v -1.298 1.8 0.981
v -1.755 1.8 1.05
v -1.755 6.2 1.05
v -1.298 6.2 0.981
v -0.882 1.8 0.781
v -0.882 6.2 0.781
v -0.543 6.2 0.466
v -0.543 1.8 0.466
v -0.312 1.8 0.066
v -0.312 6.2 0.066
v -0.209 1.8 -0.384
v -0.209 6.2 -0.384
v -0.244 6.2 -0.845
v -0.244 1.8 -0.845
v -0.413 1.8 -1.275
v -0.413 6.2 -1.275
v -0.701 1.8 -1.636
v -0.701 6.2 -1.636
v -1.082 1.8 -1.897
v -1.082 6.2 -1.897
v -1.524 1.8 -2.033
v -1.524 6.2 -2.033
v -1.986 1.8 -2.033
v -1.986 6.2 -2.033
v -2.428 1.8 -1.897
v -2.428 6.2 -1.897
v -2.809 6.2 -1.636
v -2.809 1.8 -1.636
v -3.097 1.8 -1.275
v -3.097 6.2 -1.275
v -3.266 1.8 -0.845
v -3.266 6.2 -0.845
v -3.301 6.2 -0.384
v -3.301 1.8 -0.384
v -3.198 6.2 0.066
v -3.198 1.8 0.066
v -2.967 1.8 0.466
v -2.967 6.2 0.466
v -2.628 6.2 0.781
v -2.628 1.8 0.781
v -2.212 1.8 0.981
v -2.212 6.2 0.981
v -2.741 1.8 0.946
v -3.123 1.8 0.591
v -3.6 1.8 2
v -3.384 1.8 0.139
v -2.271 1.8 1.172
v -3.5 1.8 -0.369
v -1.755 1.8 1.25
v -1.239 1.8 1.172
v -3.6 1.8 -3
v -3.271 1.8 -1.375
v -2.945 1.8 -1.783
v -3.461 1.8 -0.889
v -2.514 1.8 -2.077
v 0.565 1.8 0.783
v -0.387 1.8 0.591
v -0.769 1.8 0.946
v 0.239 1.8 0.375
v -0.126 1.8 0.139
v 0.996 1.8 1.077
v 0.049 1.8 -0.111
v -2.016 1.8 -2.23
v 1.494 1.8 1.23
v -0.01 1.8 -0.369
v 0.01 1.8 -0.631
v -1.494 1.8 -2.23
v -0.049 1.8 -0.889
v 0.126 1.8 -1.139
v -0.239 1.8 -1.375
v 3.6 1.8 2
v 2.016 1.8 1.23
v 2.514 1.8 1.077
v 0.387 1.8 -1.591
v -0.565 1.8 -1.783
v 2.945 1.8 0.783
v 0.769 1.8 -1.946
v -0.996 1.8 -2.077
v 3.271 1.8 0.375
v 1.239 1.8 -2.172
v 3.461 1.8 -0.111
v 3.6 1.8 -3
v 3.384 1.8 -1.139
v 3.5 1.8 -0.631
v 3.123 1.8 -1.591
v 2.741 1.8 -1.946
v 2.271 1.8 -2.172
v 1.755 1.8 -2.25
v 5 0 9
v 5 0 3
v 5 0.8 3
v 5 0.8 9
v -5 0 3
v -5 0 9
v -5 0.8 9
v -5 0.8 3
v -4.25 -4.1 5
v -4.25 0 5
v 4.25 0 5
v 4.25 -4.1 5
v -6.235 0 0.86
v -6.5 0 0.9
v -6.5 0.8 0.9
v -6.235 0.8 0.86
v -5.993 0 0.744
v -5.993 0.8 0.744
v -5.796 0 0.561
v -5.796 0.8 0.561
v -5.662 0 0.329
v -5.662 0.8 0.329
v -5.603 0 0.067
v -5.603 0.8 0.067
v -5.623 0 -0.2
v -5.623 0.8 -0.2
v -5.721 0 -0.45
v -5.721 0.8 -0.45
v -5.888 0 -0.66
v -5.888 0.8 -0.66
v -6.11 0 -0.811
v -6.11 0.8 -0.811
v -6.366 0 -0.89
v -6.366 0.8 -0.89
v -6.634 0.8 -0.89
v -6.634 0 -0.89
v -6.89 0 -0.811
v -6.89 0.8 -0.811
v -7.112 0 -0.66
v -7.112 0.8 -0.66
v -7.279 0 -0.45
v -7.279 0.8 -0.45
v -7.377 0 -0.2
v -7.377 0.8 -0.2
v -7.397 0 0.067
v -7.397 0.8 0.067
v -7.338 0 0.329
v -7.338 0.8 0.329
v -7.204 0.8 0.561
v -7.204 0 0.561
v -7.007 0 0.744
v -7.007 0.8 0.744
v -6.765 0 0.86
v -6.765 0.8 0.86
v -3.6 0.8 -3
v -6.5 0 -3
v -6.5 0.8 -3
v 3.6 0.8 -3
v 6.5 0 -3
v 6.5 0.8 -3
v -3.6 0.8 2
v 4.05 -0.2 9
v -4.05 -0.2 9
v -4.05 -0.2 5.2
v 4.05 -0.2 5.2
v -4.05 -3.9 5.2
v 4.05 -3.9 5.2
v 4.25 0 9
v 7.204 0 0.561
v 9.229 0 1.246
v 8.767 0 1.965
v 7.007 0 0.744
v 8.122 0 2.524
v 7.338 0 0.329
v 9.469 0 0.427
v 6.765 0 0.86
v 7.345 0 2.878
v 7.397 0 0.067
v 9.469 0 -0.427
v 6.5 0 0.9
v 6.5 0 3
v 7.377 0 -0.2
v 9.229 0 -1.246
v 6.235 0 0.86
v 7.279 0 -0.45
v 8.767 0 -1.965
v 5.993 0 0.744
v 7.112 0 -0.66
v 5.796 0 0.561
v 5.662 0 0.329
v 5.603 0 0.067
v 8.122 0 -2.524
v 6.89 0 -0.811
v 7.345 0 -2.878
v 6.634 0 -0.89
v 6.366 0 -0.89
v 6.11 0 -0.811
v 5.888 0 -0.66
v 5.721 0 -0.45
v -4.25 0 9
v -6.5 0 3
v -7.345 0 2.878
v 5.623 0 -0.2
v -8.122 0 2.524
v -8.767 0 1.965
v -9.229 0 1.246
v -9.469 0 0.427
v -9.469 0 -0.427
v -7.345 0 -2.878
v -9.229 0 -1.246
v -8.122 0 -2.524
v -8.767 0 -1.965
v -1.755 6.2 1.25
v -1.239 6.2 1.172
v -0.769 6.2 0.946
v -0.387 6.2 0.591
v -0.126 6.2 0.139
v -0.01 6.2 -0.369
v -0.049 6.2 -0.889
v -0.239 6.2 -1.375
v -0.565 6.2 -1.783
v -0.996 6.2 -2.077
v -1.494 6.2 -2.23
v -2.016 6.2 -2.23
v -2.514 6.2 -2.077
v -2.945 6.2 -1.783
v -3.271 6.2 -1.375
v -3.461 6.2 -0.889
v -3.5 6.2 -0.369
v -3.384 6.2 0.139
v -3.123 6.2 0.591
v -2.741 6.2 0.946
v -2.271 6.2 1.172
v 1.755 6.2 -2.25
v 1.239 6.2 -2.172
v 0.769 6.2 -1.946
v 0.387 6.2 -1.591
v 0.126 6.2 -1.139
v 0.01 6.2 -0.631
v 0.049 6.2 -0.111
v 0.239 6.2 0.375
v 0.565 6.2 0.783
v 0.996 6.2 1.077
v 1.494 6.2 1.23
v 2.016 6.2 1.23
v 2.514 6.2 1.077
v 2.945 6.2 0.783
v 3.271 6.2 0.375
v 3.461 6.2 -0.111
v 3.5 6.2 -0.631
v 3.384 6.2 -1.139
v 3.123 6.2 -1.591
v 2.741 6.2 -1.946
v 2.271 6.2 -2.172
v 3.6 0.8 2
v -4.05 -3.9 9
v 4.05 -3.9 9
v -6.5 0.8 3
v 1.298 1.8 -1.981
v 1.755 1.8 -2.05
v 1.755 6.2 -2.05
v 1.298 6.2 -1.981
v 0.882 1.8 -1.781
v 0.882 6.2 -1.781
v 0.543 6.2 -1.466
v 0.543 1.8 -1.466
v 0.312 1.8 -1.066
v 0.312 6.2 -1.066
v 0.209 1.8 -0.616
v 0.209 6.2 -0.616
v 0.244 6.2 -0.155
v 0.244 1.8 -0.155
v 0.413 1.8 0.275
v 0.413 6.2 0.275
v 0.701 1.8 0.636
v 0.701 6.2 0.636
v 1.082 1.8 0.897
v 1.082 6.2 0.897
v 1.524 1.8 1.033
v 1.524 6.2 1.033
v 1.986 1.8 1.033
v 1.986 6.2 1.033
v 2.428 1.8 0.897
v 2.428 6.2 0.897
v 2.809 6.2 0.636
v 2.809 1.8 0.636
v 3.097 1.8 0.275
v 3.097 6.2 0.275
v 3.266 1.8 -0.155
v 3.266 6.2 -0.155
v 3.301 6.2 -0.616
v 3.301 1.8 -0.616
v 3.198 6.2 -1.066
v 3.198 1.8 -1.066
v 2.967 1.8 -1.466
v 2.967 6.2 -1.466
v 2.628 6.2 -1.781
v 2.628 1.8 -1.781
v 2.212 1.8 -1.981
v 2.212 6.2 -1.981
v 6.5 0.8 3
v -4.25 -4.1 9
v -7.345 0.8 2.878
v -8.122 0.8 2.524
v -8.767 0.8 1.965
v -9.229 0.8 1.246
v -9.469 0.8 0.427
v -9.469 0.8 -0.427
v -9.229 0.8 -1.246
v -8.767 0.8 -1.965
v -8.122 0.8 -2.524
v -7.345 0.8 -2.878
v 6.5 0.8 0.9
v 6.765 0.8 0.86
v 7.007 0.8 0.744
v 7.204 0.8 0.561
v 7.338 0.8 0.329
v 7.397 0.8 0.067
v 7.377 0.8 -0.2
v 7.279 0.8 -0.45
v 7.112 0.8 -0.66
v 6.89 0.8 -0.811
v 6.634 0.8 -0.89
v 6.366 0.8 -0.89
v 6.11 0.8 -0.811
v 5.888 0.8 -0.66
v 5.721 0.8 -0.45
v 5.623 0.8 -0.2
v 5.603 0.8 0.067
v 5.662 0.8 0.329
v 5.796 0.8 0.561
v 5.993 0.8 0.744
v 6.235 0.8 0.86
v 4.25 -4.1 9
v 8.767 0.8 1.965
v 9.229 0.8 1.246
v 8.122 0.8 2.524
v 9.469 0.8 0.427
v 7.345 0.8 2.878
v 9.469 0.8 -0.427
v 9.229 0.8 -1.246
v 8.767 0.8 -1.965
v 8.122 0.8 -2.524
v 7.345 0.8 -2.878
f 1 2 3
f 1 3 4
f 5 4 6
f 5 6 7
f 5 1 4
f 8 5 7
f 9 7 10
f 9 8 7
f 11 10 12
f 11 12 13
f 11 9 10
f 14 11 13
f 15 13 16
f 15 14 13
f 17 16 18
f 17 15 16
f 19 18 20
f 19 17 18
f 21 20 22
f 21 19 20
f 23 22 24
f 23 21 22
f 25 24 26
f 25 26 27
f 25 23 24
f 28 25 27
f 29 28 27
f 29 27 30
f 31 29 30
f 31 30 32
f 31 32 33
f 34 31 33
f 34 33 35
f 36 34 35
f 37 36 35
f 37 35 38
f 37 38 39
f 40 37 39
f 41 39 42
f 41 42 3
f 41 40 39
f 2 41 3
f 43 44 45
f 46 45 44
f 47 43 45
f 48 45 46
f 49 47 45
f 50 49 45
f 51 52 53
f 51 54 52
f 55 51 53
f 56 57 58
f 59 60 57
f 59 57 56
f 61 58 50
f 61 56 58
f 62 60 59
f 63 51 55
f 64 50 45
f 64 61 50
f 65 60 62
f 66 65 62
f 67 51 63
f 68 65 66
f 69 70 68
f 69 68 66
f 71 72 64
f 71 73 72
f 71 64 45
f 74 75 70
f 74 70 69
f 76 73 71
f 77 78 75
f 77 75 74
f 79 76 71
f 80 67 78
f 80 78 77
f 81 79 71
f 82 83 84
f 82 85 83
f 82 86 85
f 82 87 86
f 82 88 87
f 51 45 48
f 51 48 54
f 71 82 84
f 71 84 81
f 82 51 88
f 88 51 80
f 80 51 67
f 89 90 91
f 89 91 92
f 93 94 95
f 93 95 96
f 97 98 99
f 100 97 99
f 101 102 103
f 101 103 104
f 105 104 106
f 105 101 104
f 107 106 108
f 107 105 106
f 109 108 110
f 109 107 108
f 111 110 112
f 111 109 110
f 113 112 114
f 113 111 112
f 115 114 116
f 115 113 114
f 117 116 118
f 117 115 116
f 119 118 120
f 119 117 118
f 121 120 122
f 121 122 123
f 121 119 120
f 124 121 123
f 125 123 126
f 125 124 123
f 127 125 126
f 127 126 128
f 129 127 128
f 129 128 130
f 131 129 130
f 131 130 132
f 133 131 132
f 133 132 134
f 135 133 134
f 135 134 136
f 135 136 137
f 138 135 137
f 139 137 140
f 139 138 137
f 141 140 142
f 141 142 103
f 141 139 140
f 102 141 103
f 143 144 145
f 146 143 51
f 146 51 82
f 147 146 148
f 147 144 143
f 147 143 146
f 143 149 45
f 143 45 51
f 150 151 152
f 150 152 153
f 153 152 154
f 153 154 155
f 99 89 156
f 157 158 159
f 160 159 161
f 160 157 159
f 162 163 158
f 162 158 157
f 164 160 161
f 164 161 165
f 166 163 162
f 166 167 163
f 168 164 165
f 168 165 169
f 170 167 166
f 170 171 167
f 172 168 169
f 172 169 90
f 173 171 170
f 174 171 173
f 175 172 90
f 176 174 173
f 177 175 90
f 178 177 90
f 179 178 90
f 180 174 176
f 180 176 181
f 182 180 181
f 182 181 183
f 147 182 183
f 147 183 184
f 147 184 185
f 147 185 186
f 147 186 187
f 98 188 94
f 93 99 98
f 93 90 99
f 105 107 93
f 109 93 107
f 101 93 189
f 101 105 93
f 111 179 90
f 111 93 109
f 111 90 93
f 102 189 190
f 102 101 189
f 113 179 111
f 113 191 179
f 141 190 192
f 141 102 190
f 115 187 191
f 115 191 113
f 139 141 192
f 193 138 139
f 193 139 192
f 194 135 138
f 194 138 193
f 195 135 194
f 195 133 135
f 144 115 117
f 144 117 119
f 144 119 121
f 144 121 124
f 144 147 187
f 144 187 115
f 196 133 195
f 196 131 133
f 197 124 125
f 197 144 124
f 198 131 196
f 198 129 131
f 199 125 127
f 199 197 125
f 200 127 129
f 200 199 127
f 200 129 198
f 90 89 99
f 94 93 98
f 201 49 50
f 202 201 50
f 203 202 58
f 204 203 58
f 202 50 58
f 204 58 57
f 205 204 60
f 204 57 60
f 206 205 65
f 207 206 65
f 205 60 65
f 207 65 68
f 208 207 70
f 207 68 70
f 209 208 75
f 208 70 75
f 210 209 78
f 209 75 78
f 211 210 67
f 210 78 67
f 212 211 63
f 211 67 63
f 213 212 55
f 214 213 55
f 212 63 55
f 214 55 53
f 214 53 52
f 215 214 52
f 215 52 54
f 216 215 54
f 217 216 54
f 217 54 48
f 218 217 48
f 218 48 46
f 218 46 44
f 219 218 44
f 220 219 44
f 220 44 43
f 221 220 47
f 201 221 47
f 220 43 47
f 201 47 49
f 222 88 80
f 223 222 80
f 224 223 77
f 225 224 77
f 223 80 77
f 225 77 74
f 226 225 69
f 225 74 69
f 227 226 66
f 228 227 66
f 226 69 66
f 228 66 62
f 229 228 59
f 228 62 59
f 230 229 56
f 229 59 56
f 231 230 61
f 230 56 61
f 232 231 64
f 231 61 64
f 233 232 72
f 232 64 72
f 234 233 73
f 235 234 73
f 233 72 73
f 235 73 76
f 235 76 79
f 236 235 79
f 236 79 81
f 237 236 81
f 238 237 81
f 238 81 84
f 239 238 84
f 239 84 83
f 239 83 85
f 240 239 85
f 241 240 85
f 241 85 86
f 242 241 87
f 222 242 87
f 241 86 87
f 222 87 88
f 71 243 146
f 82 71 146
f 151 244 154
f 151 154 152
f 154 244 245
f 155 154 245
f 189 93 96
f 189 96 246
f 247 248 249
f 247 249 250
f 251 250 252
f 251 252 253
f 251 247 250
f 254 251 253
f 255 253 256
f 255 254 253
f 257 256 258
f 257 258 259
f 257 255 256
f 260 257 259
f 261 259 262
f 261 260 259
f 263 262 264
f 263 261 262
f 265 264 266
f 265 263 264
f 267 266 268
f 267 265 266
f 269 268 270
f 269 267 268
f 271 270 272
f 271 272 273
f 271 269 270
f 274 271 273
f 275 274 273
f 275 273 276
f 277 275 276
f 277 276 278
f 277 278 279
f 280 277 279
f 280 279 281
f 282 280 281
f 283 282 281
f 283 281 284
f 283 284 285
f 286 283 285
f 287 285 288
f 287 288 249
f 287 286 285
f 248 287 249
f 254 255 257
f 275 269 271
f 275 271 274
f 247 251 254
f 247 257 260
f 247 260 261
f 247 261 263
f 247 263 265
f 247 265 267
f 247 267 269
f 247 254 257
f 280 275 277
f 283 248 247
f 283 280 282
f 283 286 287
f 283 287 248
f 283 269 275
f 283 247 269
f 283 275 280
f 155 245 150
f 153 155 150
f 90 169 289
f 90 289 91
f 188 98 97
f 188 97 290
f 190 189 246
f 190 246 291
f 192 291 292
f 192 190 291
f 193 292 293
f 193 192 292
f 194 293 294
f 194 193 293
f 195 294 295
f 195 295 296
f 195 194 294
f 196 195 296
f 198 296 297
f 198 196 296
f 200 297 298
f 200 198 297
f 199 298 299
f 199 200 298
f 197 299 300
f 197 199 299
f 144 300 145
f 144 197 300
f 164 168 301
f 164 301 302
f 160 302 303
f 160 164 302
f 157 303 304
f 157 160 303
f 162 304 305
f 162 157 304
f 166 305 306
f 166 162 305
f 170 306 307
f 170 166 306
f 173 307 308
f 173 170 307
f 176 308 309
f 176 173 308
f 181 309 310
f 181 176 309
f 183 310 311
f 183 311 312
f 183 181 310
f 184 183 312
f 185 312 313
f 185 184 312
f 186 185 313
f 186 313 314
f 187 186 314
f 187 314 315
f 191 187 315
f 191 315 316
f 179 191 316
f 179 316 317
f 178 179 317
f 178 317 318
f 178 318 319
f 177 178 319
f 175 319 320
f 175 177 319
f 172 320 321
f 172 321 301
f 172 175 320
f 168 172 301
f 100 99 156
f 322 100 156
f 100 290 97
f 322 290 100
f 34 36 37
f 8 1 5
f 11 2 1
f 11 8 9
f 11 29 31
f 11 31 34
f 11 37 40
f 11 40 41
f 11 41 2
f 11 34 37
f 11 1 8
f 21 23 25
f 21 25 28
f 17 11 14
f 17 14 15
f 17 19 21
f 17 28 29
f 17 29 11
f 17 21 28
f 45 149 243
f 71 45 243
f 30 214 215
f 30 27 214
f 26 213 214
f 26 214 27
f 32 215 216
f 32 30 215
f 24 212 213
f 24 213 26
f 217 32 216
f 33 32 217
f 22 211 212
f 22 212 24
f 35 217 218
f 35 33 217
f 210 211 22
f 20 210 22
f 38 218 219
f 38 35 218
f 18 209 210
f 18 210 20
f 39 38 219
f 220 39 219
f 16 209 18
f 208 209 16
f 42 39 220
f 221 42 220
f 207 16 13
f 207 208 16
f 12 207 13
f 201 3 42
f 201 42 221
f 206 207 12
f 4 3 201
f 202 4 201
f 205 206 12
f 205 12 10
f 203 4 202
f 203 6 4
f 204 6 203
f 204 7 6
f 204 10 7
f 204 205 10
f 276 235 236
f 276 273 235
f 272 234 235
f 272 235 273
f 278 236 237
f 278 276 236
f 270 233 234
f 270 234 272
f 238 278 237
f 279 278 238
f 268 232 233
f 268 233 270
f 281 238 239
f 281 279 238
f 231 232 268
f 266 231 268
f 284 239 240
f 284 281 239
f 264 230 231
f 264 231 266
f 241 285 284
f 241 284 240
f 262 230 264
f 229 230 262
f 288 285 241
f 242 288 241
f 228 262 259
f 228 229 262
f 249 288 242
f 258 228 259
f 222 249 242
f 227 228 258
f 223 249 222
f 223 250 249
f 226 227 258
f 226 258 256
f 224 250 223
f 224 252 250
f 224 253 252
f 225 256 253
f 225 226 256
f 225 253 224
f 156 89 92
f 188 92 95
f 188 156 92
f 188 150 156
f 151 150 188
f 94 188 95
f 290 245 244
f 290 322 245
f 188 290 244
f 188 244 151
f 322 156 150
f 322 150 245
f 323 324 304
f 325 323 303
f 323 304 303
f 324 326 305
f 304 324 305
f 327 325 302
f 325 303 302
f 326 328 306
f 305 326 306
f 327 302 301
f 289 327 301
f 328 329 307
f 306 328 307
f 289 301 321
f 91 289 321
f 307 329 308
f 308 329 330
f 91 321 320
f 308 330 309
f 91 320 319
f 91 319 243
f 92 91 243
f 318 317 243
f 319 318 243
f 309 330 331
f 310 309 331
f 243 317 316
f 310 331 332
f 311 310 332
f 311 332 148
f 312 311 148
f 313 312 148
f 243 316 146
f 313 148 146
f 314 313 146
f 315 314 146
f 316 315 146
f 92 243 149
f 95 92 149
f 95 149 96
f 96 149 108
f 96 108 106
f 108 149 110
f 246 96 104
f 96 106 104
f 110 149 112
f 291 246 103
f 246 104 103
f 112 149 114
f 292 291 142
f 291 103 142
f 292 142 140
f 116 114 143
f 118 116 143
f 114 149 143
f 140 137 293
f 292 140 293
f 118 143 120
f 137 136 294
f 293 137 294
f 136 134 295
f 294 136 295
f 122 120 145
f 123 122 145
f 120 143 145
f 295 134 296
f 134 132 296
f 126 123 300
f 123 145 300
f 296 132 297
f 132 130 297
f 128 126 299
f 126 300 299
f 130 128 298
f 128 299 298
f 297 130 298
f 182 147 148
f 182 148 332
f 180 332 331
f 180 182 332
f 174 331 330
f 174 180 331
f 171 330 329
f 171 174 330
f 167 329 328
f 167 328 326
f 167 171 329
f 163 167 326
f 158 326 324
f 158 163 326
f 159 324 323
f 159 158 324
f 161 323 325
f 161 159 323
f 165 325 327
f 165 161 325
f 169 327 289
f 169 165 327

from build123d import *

# Parameters (mm, degrees)
SKETCH_2_R          = 0.9
EXTRUDE_1_DEPTH     = 0.8
SKETCH_3_W          = 7.2
SKETCH_3_H          = 5
EXTRUDE_2_DEPTH     = 1
SKETCH_4_R          = 1.75
SKETCH_4_R_2        = 1.55
EXTRUDE_5_DEPTH     = 4.4
SKETCH_6_W          = 8.5
SKETCH_6_H          = 4
EXTRUDE_6_DEPTH     = 4.1
SKETCH_7_W          = 8.1
SKETCH_7_H          = 3.7
CUT_EXTRUDE_1_DEPTH = 3.8


with BuildPart() as part:
    # 草图2 → 凸台-拉伸1 (new body)
    with BuildSketch(Plane(origin=(0, 0, 0), x_dir=(1, 0, 0), z_dir=(0, 1, 0))):
        with BuildLine():
            Line((-6.5, 3), (6.5, 3))
            ThreePointArc((6.5, 3), (9.5, 0), (6.5, -3))
            Line((6.5, -3), (5, -3))
            Line((5, -3), (5, -9))
            Line((5, -9), (-5, -9))
            Line((-5, -9), (-5, -3))
            Line((-5, -3), (-6.5, -3))
            ThreePointArc((-6.5, -3), (-9.5, 0), (-6.5, 3))
        make_face()
        with Locations(Location((-6.5, 0, 0), (0, 0, 270))):
            Circle(SKETCH_2_R, mode=Mode.SUBTRACT)
        with Locations(Location((6.5, 0, 0), (0, 0, 270))):
            Circle(SKETCH_2_R, mode=Mode.SUBTRACT)
    extrude(amount=EXTRUDE_1_DEPTH)

    # 草图3 → 凸台-拉伸2 (add)
    with BuildSketch(Plane(origin=(0, 0.8, 0), x_dir=(1, 0, 0), z_dir=(0, 1, 0))):
        with Locations((0, 0.5)):
            Rectangle(SKETCH_3_W, SKETCH_3_H)
    extrude(amount=EXTRUDE_2_DEPTH)

    # 草图4 → 凸台-拉伸5 (add)
    # profile 1 of 2: a face of its own
    with BuildSketch(Plane(origin=(0, 1.8, 0), x_dir=(1, 0, 0), z_dir=(0, 1, 0))):
        with Locations(Location((-1.755, 0.5, 0), (0, 0, 270))):
            Circle(SKETCH_4_R)
        with Locations(Location((-1.755, 0.5, 0), (0, 0, 270))):
            Circle(SKETCH_4_R_2, mode=Mode.SUBTRACT)
    # profile 2 of 2: a face of its own
    with BuildSketch(Plane(origin=(0, 1.8, 0), x_dir=(1, 0, 0), z_dir=(0, 1, 0))):
        with Locations(Location((1.755, 0.5, 0), (0, 0, 90))):
            Circle(SKETCH_4_R)
        with Locations(Location((1.755, 0.5, 0), (0, 0, 90))):
            Circle(SKETCH_4_R_2, mode=Mode.SUBTRACT)
    extrude(amount=EXTRUDE_5_DEPTH)

    # 草图6 → 凸台-拉伸6 (add)
    with BuildSketch(Plane.XZ):
        with Locations((0, 7)):
            Rectangle(SKETCH_6_W, SKETCH_6_H)
    extrude(amount=EXTRUDE_6_DEPTH)

    # 草图7 → 切除-拉伸1 (cut)
    with BuildSketch(Plane.XY.offset(9)):
        with Locations((0, -2.05)):
            Rectangle(SKETCH_7_W, SKETCH_7_H)
    extrude(amount=-CUT_EXTRUDE_1_DEPTH, mode=Mode.SUBTRACT)


solid = part.part
